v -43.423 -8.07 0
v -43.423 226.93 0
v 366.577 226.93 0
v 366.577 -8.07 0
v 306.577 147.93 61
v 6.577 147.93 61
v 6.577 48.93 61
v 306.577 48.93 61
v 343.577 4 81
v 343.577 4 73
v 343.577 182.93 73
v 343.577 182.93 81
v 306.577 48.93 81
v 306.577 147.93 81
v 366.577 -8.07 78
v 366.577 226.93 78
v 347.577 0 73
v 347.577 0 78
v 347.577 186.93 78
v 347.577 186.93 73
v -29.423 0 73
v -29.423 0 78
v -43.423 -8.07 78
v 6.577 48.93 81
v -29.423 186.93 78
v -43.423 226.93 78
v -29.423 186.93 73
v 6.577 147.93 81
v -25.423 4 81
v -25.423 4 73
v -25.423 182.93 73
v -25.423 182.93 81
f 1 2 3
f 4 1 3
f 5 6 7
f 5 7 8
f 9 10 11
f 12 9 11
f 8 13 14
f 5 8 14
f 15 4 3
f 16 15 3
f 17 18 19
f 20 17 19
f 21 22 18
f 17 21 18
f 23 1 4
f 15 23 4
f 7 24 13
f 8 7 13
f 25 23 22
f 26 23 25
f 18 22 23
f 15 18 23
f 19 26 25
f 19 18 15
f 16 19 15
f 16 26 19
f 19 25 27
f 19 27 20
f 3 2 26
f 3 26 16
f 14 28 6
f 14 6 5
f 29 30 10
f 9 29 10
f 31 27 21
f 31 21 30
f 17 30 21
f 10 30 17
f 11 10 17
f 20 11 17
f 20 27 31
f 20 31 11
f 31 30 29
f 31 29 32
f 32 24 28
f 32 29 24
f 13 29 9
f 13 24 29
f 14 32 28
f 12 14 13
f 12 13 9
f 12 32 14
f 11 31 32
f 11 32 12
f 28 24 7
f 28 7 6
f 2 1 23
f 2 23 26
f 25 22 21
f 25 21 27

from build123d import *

# Parameters (mm, degrees)
CROQUIS1_W              = 410
CROQUIS1_H              = 235
SALIENTE_EXTRUIR1_DEPTH = 78
CROQUIS2_W              = 377
CROQUIS2_H              = 186.930394922
CORTAR_EXTRUIR1_DEPTH   = 5
CROQUIS3_W              = 369
CROQUIS3_H              = 178.930394922
SALIENTE_EXTRUIR2_DEPTH = 8
CROQUIS5_W              = 300
CROQUIS5_H              = 99
CORTAR_EXTRUIR2_DEPTH   = 20


with BuildPart() as part:
    # Croquis1 → Saliente-Extruir1 (new body)
    with BuildSketch(Plane.XY):
        with Locations((161.576639223, 109.430394922)):
            Rectangle(CROQUIS1_W, CROQUIS1_H)
    extrude(amount=SALIENTE_EXTRUIR1_DEPTH)

    # Croquis2 → Cortar-Extruir1 (cut)
    with BuildSketch(Plane.XY.offset(78)):
        with Locations((159.076639223, 93.465197461)):
            Rectangle(CROQUIS2_W, CROQUIS2_H)
    extrude(amount=-CORTAR_EXTRUIR1_DEPTH, mode=Mode.SUBTRACT)

    # Croquis3 → Saliente-Extruir2 (add)
    with BuildSketch(Plane.XY.offset(73)):
        with Locations((159.076639223, 93.465197461)):
            Rectangle(CROQUIS3_W, CROQUIS3_H)
    extrude(amount=SALIENTE_EXTRUIR2_DEPTH)

    # Croquis5 → Cortar-Extruir2 (cut)
    with BuildSketch(Plane.XY.offset(81)):
        with Locations((156.576639223, 98.430394922)):
            Rectangle(CROQUIS5_W, CROQUIS5_H)
    extrude(amount=-CORTAR_EXTRUIR2_DEPTH, mode=Mode.SUBTRACT)


solid = part.part
